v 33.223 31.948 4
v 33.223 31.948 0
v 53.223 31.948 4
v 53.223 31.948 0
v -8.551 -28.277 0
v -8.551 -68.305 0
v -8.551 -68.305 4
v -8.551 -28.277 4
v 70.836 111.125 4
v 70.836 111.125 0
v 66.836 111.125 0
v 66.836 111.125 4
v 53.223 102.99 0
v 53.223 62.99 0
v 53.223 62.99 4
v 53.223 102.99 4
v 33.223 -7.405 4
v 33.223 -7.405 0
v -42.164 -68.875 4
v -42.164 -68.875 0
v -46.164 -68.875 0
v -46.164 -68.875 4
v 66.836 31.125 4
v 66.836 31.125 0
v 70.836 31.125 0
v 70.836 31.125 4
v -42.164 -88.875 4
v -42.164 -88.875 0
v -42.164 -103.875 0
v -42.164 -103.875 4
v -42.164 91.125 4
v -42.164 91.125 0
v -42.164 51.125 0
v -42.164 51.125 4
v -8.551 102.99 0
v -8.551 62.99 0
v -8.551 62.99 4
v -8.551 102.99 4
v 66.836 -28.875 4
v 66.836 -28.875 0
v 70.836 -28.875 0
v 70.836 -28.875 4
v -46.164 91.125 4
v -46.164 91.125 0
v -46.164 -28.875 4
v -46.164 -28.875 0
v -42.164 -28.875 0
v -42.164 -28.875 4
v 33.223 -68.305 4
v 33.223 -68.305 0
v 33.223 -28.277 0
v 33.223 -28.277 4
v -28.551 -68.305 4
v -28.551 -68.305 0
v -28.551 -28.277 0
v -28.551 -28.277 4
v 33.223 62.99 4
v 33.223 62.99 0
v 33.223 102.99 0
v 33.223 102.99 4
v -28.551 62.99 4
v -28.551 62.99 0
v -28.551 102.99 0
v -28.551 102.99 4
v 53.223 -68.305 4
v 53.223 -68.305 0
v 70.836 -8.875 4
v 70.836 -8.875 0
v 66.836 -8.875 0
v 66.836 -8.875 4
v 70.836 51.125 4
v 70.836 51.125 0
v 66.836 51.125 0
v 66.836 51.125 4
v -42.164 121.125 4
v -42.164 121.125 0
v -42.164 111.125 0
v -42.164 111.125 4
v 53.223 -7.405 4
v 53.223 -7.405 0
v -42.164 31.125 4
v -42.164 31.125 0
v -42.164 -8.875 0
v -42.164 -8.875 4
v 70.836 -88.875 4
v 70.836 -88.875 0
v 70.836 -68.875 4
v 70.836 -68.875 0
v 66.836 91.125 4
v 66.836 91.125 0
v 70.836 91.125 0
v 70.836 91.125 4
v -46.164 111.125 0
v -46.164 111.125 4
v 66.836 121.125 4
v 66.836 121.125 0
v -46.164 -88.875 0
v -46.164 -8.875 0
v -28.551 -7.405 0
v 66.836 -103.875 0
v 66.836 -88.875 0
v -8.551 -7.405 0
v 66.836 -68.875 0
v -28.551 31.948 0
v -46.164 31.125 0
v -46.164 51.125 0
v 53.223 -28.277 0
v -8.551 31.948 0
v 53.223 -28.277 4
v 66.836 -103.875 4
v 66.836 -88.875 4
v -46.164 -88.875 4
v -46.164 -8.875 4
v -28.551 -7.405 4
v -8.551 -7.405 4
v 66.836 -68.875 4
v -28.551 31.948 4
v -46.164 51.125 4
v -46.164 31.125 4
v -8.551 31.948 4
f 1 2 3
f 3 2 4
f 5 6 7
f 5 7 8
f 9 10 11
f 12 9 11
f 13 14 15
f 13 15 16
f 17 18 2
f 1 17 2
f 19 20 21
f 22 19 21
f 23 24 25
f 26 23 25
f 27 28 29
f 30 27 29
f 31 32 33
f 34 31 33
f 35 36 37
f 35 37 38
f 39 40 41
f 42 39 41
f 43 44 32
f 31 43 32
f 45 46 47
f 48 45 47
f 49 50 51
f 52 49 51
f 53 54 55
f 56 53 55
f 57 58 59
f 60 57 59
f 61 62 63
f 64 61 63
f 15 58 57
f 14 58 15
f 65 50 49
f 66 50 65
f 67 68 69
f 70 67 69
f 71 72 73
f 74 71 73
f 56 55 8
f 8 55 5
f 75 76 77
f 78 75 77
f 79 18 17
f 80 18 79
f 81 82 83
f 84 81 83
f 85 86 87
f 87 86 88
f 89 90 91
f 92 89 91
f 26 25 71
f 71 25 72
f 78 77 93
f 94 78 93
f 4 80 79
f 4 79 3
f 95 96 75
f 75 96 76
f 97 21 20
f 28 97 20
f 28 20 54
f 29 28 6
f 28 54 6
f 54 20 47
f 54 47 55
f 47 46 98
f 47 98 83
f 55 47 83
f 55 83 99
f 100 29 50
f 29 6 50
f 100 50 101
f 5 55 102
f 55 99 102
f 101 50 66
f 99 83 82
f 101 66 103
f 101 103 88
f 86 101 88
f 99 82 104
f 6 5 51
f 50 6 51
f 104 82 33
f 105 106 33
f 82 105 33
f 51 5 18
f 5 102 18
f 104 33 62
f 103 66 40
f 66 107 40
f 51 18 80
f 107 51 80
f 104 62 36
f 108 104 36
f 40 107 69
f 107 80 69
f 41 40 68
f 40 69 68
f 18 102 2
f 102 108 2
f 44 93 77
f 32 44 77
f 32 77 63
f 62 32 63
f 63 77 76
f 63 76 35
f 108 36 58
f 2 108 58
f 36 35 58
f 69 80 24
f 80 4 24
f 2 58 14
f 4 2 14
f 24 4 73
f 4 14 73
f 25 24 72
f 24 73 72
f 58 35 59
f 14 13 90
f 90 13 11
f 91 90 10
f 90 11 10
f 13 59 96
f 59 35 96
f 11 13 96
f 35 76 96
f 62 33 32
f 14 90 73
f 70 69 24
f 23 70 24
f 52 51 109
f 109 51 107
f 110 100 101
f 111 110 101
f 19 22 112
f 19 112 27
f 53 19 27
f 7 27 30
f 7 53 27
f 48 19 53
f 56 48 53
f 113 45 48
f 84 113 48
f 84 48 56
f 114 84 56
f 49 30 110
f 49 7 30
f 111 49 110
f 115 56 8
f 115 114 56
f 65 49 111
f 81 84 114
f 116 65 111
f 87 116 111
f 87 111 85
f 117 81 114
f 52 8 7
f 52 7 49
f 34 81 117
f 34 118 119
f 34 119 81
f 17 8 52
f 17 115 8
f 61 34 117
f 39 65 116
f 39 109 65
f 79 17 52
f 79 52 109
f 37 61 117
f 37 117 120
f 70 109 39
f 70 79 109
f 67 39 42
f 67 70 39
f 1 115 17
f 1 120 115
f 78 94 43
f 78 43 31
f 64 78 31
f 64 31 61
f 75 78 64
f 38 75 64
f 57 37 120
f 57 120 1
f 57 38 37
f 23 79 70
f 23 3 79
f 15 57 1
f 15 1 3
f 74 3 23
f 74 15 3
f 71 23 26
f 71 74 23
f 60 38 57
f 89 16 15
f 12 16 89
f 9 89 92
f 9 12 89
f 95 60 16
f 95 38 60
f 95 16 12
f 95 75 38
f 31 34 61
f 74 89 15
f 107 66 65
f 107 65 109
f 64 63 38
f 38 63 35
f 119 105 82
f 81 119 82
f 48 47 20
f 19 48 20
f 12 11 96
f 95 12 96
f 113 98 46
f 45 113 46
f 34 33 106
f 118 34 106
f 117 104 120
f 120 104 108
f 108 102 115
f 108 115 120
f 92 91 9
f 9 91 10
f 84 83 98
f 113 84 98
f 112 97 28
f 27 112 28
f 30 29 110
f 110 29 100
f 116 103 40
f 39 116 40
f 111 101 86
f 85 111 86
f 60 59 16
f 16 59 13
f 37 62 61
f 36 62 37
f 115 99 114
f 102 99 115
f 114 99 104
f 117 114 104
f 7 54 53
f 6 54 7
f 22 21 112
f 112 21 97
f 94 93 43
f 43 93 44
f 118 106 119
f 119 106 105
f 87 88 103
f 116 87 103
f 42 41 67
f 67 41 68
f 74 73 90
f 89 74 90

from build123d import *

# Parameters (mm, degrees)
SKETCH1_W           = 20
SKETCH1_H           = 40.02889445
SKETCH1_H_2         = 40
SKETCH1_H_3         = 39.353713997
BOSS_EXTRUDE1_DEPTH = 4


with BuildPart() as part:
    # Sketch1 → Boss-Extrude1 (new body)
    with BuildSketch(Plane.XY):
        Polygon((66.836116993, 121.125108431), (-42.163883007, 121.125108431), (-42.163883007, 111.125108431), (-46.163883007, 111.125108431), (-46.163883007, 91.125108431), (-42.163883007, 91.125108431), (-42.163883007, 51.125108431), (-46.163883007, 51.125108431), (-46.163883007, 31.125108431), (-42.163883007, 31.125108431), (-42.163883007, -8.874891569), (-46.163883007, -8.874891569), (-46.163883007, -28.874891569), (-42.163883007, -28.874891569), (-42.163883007, -68.874891569), (-46.163883007, -68.874891569), (-46.163883007, -88.874891569), (-42.163883007, -88.874891569), (-42.163883007, -103.874891569), (66.836116993, -103.874891569), (66.836116993, -88.874891569), (70.836116993, -88.874891569), (70.836116993, -68.874891569), (66.836116993, -68.874891569), (66.836116993, -28.874891569), (70.836116993, -28.874891569), (70.836116993, -8.874891569), (66.836116993, -8.874891569), (66.836116993, 31.125108431), (70.836116993, 31.125108431), (70.836116993, 51.125108431), (66.836116993, 51.125108431), (66.836116993, 91.125108431), (70.836116993, 91.125108431), (70.836116993, 111.125108431), (66.836116993, 111.125108431), align=None)
        with Locations((43.223488174, -48.291018479)):
            Rectangle(SKETCH1_W, SKETCH1_H, mode=Mode.SUBTRACT)
        with Locations((-18.551254188, 82.990248393)):
            Rectangle(SKETCH1_W, SKETCH1_H_2, mode=Mode.SUBTRACT)
        with Locations((-18.551254188, 12.271619921)):
            Rectangle(SKETCH1_W, SKETCH1_H_3, mode=Mode.SUBTRACT)
        with Locations((-18.551254188, -48.291018479)):
            Rectangle(SKETCH1_W, SKETCH1_H, mode=Mode.SUBTRACT)
        with Locations((43.223488174, 12.271619921)):
            Rectangle(SKETCH1_W, SKETCH1_H_3, mode=Mode.SUBTRACT)
        with Locations((43.223488174, 82.990248393)):
            Rectangle(SKETCH1_W, SKETCH1_H_2, mode=Mode.SUBTRACT)
    extrude(amount=BOSS_EXTRUDE1_DEPTH)


solid = part.part
